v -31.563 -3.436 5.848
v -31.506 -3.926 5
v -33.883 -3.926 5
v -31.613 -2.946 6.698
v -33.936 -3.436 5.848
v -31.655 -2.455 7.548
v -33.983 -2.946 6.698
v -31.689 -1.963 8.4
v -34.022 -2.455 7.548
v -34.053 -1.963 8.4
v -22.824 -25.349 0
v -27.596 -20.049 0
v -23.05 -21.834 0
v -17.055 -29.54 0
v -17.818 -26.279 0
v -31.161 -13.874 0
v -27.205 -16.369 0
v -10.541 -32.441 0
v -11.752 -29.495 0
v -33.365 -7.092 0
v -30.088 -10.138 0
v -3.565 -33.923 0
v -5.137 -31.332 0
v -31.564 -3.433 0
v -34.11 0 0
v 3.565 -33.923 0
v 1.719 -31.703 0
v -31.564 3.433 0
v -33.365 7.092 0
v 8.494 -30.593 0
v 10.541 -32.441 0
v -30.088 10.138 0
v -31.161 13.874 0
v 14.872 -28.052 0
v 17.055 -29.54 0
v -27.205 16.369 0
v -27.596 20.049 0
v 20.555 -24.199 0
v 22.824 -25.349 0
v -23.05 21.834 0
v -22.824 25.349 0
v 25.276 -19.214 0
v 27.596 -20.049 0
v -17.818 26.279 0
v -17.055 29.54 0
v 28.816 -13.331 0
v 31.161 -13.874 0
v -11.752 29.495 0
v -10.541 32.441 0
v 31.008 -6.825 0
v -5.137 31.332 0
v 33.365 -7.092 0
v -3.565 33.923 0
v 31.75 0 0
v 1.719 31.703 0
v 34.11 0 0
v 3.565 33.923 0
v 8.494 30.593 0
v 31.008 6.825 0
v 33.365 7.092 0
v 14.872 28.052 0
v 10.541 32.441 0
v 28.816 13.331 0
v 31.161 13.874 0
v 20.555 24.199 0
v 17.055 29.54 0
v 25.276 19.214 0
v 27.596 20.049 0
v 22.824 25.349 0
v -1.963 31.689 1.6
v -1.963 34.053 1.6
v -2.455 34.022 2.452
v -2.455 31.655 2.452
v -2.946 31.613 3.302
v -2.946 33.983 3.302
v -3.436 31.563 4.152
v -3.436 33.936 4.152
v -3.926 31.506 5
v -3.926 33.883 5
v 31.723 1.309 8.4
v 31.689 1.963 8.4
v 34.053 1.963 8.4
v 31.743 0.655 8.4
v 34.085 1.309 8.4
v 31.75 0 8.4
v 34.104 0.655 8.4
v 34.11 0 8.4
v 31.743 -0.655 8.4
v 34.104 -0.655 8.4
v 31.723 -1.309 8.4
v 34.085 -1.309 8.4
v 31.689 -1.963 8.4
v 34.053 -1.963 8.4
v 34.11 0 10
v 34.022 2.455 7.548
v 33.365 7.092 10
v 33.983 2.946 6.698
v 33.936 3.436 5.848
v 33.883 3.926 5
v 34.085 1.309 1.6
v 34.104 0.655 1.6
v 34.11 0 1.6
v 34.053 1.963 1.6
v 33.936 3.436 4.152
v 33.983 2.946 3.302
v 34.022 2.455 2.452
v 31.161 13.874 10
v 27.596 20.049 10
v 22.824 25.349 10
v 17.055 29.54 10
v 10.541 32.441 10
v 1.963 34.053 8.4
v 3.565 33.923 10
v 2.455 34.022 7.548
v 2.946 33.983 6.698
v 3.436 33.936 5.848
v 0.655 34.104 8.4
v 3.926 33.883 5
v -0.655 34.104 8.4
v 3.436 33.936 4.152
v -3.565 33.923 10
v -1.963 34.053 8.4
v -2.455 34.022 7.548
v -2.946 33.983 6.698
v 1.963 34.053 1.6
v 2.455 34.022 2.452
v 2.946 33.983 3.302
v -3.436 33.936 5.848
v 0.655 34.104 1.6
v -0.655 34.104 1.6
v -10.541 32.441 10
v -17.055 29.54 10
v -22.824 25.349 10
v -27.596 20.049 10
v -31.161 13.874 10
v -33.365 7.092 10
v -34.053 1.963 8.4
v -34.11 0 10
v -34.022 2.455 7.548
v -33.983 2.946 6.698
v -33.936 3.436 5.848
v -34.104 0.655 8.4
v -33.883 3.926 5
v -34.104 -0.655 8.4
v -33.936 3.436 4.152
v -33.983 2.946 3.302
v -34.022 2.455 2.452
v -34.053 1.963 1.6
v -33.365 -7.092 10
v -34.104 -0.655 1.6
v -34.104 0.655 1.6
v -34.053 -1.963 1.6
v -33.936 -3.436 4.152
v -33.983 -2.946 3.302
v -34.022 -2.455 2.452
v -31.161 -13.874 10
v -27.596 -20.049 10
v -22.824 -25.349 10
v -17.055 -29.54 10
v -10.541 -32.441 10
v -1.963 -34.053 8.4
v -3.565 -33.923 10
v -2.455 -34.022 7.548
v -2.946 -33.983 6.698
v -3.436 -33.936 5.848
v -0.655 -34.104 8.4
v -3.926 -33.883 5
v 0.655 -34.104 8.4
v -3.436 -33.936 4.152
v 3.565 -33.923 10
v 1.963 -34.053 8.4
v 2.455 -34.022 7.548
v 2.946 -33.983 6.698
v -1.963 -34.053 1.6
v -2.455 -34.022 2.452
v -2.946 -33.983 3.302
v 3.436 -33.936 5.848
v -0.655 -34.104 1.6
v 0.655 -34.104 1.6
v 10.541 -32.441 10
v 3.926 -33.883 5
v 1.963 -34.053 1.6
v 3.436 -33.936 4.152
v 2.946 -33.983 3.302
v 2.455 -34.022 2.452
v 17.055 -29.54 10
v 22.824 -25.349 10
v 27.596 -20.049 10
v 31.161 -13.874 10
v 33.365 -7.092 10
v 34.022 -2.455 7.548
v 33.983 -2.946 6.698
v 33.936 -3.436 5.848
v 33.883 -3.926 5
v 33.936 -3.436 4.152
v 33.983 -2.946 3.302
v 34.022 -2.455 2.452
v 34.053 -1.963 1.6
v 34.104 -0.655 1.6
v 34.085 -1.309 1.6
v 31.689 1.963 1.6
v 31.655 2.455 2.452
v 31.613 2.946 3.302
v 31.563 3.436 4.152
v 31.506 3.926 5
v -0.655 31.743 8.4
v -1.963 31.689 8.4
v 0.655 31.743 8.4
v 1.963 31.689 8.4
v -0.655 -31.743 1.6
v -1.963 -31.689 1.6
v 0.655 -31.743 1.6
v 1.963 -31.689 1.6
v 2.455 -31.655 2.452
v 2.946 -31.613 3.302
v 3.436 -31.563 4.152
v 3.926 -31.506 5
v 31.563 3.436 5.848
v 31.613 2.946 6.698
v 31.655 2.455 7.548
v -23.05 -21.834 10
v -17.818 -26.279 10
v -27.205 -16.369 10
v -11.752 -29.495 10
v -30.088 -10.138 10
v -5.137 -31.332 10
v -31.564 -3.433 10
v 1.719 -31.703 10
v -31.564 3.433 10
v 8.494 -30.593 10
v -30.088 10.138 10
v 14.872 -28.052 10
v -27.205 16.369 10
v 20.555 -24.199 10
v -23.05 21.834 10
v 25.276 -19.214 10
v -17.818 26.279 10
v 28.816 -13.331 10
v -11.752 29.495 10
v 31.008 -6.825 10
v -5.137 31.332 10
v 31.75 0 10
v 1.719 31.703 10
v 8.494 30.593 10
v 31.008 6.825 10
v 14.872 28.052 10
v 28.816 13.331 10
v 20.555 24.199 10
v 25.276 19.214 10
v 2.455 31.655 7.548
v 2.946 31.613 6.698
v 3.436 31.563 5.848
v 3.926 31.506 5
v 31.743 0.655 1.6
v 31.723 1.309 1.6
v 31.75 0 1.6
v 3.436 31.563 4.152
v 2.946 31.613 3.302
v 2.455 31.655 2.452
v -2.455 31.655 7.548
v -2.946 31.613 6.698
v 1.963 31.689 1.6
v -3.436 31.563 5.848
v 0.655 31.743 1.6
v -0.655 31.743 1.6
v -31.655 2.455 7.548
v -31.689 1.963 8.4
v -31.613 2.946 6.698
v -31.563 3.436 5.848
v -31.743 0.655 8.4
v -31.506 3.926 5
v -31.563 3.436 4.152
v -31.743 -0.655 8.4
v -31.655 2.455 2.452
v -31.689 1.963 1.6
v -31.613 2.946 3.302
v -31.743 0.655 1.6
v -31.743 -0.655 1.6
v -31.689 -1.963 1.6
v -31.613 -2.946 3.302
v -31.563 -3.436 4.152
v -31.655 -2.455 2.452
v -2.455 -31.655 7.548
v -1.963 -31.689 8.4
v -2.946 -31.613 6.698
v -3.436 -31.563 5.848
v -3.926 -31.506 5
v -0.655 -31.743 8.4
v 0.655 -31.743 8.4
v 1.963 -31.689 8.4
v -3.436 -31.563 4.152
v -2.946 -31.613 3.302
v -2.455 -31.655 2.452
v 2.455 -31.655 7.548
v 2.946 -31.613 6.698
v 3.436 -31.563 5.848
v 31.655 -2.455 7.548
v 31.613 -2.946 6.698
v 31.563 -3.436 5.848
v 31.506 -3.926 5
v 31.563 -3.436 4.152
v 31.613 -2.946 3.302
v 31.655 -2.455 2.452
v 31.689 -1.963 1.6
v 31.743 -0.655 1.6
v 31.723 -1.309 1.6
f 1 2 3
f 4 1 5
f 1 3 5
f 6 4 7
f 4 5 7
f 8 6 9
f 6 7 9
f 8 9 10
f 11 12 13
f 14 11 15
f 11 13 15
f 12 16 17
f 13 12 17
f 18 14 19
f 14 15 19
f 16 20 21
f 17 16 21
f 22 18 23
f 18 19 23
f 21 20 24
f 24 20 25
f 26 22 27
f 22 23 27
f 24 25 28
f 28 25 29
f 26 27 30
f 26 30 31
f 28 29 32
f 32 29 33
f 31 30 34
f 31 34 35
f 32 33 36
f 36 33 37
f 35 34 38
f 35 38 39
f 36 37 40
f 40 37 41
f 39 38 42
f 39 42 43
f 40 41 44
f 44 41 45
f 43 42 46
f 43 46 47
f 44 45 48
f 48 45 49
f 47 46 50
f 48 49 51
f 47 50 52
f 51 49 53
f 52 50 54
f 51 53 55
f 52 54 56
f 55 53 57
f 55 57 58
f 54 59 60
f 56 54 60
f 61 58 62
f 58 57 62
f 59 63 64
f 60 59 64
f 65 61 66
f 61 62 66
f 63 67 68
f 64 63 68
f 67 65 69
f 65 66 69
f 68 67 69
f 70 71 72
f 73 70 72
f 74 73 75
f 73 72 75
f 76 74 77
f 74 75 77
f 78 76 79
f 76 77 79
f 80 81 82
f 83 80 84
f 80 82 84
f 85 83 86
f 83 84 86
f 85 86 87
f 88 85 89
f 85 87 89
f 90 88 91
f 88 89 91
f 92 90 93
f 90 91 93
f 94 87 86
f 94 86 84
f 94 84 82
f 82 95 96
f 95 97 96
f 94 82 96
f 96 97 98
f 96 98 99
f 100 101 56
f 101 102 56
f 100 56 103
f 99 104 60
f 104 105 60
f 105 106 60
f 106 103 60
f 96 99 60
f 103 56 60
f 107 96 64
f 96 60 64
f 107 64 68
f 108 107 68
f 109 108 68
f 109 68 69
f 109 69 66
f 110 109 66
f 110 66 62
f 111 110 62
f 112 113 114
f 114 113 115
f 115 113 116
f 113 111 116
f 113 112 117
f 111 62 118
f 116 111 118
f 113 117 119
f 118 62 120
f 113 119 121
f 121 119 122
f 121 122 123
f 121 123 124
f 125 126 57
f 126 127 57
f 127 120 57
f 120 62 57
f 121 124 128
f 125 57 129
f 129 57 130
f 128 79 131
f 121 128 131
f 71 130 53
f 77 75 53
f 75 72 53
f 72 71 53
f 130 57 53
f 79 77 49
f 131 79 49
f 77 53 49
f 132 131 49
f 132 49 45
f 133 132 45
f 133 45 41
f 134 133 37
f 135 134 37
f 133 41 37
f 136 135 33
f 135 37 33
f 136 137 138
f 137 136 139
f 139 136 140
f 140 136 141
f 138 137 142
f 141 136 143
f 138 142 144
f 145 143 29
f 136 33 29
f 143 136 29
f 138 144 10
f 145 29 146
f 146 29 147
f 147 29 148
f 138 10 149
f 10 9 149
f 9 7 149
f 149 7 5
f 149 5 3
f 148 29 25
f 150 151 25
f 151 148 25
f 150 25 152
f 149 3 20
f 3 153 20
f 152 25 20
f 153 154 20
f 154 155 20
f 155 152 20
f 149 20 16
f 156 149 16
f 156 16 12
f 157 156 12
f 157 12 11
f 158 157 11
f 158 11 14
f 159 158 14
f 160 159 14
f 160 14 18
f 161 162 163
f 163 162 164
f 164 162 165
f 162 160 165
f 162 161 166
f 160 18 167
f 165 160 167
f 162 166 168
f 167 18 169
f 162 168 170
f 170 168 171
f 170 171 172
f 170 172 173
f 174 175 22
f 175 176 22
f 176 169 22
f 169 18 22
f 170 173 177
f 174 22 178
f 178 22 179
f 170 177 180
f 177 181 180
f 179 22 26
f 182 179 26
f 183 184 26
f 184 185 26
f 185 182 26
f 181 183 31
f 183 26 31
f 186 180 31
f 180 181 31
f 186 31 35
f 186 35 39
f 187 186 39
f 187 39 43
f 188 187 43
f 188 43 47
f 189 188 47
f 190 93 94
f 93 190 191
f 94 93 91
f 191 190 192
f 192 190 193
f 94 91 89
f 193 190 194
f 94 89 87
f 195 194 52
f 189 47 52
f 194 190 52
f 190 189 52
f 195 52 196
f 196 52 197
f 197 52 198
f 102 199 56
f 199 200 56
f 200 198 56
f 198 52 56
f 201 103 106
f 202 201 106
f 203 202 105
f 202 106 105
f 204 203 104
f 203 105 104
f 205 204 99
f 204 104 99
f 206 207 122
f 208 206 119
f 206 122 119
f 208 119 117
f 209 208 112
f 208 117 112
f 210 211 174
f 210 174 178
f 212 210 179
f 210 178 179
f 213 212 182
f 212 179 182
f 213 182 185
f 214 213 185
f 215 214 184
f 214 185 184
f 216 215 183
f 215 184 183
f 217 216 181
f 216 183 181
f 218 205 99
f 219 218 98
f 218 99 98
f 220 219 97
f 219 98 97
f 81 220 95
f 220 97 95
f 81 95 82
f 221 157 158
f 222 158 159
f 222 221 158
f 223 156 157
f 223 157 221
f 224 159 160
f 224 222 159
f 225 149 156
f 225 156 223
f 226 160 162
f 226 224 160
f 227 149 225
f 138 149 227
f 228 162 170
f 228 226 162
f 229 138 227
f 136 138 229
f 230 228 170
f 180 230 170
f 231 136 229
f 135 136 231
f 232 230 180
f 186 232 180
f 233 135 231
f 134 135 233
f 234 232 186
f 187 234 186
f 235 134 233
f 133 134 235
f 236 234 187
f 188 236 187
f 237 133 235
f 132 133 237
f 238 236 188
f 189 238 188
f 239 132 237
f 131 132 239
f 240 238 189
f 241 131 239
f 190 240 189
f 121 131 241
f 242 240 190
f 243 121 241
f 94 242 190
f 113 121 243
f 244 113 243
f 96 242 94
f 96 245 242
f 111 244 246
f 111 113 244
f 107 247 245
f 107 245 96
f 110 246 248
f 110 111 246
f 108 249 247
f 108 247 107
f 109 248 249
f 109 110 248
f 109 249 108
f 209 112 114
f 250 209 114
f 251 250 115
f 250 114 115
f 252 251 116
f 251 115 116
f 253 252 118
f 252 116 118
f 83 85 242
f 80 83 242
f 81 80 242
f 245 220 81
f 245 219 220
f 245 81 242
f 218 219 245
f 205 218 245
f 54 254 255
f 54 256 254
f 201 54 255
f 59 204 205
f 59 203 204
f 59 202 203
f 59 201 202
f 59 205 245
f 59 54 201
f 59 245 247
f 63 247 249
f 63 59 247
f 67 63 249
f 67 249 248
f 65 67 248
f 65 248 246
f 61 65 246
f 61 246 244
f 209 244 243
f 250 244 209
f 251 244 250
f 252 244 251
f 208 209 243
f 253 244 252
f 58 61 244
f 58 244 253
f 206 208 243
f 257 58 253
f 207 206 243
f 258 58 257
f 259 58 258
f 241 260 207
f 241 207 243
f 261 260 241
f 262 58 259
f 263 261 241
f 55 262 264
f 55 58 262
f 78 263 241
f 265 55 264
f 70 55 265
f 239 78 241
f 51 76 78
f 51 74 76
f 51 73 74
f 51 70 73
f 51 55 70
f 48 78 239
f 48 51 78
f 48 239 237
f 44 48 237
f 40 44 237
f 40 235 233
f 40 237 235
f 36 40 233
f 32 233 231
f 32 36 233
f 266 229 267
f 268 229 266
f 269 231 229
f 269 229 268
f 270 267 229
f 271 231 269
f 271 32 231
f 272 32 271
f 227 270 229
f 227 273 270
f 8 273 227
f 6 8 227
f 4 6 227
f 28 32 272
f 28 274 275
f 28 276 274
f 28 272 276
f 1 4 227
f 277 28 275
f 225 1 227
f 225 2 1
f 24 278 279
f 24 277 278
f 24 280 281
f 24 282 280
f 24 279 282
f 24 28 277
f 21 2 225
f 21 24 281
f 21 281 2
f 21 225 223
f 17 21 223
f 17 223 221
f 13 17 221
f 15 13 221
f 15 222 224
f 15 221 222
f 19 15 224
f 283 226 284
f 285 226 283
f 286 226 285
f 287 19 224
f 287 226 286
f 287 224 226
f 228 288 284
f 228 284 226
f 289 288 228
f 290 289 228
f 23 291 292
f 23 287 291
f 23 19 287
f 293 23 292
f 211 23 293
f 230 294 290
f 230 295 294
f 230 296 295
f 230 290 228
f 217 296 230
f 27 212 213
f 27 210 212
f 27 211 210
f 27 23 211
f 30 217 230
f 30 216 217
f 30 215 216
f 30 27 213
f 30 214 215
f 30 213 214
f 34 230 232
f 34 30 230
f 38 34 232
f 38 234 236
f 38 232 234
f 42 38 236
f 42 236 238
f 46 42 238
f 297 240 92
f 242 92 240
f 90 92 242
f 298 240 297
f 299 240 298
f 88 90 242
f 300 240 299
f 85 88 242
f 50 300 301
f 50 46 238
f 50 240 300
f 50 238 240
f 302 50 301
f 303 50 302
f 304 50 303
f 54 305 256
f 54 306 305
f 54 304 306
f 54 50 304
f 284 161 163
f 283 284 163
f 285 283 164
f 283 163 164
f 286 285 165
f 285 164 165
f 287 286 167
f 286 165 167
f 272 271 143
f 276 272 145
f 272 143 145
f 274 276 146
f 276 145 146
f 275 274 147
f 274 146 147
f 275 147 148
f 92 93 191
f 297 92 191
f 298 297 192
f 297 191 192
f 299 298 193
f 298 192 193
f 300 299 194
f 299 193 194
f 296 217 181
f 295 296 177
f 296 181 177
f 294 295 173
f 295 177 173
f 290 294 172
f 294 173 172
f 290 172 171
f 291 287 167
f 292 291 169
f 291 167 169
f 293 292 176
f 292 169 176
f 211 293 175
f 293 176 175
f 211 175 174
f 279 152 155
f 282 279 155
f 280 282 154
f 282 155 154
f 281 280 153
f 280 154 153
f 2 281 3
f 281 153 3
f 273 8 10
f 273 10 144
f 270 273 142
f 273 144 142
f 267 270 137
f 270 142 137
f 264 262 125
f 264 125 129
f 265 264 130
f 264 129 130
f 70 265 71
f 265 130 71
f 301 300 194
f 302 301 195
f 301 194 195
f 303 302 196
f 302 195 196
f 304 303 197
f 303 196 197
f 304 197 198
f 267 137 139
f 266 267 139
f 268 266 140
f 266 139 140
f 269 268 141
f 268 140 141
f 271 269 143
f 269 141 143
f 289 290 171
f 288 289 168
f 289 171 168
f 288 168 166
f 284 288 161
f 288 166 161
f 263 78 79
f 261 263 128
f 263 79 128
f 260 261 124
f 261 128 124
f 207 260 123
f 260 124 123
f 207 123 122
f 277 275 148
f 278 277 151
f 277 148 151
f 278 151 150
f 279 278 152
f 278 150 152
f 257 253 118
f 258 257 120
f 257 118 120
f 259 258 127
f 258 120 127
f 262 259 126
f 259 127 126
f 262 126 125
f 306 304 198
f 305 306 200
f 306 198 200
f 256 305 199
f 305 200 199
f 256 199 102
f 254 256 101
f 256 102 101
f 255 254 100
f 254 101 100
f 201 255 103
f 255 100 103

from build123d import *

# Parameters (mm, degrees)
SKETCH1_R           = 34.11
SKETCH1_R_2         = 31.75
BOSS_EXTRUDE1_DEPTH = 11.5
CUT_EXTRUDE1_DEPTH  = 10
CIRPATTERN2_COUNT   = 4
CUT_EXTRUDE2_START  = -1.5
SKETCH3_R           = 34.11
CUT_EXTRUDE2_DEPTH  = 1.5


with BuildPart() as part:
    # Sketch1 → Boss-Extrude1 (new body)
    with BuildSketch(Plane.XY):
        Circle(SKETCH1_R)
        Circle(SKETCH1_R_2, mode=Mode.SUBTRACT)
    extrude(amount=BOSS_EXTRUDE1_DEPTH)

    # Sketch2 → Cut-Extrude1 (cut)
    with BuildSketch(Plane(origin=(0, 34.11, 0), x_dir=(1, 0, 0), z_dir=(0, 1, 0))):
        Polygon((3.92598183, -5), (1.962990915, -1.6), (-1.962990915, -1.6), (-3.92598183, -5), (-1.962990915, -8.4), (1.962990915, -8.4), align=None)
    cut_extrude1 = extrude(amount=-CUT_EXTRUDE1_DEPTH, mode=Mode.SUBTRACT)

    # CirPattern2: Cut-Extrude1 ×4 about axis
    cirpattern2_axis = Axis((0, 0, 0), (0, 0, 1))
    for i in range(1, CIRPATTERN2_COUNT):
        add(cut_extrude1.rotate(cirpattern2_axis, i * 360 / CIRPATTERN2_COUNT), mode=Mode.SUBTRACT)

    # Sketch3 → Cut-Extrude2 (cut)
    with BuildSketch(Plane.XY.offset(11.5).offset(CUT_EXTRUDE2_START)):
        Circle(SKETCH3_R)
    extrude(amount=CUT_EXTRUDE2_DEPTH, mode=Mode.SUBTRACT)


solid = part.part
